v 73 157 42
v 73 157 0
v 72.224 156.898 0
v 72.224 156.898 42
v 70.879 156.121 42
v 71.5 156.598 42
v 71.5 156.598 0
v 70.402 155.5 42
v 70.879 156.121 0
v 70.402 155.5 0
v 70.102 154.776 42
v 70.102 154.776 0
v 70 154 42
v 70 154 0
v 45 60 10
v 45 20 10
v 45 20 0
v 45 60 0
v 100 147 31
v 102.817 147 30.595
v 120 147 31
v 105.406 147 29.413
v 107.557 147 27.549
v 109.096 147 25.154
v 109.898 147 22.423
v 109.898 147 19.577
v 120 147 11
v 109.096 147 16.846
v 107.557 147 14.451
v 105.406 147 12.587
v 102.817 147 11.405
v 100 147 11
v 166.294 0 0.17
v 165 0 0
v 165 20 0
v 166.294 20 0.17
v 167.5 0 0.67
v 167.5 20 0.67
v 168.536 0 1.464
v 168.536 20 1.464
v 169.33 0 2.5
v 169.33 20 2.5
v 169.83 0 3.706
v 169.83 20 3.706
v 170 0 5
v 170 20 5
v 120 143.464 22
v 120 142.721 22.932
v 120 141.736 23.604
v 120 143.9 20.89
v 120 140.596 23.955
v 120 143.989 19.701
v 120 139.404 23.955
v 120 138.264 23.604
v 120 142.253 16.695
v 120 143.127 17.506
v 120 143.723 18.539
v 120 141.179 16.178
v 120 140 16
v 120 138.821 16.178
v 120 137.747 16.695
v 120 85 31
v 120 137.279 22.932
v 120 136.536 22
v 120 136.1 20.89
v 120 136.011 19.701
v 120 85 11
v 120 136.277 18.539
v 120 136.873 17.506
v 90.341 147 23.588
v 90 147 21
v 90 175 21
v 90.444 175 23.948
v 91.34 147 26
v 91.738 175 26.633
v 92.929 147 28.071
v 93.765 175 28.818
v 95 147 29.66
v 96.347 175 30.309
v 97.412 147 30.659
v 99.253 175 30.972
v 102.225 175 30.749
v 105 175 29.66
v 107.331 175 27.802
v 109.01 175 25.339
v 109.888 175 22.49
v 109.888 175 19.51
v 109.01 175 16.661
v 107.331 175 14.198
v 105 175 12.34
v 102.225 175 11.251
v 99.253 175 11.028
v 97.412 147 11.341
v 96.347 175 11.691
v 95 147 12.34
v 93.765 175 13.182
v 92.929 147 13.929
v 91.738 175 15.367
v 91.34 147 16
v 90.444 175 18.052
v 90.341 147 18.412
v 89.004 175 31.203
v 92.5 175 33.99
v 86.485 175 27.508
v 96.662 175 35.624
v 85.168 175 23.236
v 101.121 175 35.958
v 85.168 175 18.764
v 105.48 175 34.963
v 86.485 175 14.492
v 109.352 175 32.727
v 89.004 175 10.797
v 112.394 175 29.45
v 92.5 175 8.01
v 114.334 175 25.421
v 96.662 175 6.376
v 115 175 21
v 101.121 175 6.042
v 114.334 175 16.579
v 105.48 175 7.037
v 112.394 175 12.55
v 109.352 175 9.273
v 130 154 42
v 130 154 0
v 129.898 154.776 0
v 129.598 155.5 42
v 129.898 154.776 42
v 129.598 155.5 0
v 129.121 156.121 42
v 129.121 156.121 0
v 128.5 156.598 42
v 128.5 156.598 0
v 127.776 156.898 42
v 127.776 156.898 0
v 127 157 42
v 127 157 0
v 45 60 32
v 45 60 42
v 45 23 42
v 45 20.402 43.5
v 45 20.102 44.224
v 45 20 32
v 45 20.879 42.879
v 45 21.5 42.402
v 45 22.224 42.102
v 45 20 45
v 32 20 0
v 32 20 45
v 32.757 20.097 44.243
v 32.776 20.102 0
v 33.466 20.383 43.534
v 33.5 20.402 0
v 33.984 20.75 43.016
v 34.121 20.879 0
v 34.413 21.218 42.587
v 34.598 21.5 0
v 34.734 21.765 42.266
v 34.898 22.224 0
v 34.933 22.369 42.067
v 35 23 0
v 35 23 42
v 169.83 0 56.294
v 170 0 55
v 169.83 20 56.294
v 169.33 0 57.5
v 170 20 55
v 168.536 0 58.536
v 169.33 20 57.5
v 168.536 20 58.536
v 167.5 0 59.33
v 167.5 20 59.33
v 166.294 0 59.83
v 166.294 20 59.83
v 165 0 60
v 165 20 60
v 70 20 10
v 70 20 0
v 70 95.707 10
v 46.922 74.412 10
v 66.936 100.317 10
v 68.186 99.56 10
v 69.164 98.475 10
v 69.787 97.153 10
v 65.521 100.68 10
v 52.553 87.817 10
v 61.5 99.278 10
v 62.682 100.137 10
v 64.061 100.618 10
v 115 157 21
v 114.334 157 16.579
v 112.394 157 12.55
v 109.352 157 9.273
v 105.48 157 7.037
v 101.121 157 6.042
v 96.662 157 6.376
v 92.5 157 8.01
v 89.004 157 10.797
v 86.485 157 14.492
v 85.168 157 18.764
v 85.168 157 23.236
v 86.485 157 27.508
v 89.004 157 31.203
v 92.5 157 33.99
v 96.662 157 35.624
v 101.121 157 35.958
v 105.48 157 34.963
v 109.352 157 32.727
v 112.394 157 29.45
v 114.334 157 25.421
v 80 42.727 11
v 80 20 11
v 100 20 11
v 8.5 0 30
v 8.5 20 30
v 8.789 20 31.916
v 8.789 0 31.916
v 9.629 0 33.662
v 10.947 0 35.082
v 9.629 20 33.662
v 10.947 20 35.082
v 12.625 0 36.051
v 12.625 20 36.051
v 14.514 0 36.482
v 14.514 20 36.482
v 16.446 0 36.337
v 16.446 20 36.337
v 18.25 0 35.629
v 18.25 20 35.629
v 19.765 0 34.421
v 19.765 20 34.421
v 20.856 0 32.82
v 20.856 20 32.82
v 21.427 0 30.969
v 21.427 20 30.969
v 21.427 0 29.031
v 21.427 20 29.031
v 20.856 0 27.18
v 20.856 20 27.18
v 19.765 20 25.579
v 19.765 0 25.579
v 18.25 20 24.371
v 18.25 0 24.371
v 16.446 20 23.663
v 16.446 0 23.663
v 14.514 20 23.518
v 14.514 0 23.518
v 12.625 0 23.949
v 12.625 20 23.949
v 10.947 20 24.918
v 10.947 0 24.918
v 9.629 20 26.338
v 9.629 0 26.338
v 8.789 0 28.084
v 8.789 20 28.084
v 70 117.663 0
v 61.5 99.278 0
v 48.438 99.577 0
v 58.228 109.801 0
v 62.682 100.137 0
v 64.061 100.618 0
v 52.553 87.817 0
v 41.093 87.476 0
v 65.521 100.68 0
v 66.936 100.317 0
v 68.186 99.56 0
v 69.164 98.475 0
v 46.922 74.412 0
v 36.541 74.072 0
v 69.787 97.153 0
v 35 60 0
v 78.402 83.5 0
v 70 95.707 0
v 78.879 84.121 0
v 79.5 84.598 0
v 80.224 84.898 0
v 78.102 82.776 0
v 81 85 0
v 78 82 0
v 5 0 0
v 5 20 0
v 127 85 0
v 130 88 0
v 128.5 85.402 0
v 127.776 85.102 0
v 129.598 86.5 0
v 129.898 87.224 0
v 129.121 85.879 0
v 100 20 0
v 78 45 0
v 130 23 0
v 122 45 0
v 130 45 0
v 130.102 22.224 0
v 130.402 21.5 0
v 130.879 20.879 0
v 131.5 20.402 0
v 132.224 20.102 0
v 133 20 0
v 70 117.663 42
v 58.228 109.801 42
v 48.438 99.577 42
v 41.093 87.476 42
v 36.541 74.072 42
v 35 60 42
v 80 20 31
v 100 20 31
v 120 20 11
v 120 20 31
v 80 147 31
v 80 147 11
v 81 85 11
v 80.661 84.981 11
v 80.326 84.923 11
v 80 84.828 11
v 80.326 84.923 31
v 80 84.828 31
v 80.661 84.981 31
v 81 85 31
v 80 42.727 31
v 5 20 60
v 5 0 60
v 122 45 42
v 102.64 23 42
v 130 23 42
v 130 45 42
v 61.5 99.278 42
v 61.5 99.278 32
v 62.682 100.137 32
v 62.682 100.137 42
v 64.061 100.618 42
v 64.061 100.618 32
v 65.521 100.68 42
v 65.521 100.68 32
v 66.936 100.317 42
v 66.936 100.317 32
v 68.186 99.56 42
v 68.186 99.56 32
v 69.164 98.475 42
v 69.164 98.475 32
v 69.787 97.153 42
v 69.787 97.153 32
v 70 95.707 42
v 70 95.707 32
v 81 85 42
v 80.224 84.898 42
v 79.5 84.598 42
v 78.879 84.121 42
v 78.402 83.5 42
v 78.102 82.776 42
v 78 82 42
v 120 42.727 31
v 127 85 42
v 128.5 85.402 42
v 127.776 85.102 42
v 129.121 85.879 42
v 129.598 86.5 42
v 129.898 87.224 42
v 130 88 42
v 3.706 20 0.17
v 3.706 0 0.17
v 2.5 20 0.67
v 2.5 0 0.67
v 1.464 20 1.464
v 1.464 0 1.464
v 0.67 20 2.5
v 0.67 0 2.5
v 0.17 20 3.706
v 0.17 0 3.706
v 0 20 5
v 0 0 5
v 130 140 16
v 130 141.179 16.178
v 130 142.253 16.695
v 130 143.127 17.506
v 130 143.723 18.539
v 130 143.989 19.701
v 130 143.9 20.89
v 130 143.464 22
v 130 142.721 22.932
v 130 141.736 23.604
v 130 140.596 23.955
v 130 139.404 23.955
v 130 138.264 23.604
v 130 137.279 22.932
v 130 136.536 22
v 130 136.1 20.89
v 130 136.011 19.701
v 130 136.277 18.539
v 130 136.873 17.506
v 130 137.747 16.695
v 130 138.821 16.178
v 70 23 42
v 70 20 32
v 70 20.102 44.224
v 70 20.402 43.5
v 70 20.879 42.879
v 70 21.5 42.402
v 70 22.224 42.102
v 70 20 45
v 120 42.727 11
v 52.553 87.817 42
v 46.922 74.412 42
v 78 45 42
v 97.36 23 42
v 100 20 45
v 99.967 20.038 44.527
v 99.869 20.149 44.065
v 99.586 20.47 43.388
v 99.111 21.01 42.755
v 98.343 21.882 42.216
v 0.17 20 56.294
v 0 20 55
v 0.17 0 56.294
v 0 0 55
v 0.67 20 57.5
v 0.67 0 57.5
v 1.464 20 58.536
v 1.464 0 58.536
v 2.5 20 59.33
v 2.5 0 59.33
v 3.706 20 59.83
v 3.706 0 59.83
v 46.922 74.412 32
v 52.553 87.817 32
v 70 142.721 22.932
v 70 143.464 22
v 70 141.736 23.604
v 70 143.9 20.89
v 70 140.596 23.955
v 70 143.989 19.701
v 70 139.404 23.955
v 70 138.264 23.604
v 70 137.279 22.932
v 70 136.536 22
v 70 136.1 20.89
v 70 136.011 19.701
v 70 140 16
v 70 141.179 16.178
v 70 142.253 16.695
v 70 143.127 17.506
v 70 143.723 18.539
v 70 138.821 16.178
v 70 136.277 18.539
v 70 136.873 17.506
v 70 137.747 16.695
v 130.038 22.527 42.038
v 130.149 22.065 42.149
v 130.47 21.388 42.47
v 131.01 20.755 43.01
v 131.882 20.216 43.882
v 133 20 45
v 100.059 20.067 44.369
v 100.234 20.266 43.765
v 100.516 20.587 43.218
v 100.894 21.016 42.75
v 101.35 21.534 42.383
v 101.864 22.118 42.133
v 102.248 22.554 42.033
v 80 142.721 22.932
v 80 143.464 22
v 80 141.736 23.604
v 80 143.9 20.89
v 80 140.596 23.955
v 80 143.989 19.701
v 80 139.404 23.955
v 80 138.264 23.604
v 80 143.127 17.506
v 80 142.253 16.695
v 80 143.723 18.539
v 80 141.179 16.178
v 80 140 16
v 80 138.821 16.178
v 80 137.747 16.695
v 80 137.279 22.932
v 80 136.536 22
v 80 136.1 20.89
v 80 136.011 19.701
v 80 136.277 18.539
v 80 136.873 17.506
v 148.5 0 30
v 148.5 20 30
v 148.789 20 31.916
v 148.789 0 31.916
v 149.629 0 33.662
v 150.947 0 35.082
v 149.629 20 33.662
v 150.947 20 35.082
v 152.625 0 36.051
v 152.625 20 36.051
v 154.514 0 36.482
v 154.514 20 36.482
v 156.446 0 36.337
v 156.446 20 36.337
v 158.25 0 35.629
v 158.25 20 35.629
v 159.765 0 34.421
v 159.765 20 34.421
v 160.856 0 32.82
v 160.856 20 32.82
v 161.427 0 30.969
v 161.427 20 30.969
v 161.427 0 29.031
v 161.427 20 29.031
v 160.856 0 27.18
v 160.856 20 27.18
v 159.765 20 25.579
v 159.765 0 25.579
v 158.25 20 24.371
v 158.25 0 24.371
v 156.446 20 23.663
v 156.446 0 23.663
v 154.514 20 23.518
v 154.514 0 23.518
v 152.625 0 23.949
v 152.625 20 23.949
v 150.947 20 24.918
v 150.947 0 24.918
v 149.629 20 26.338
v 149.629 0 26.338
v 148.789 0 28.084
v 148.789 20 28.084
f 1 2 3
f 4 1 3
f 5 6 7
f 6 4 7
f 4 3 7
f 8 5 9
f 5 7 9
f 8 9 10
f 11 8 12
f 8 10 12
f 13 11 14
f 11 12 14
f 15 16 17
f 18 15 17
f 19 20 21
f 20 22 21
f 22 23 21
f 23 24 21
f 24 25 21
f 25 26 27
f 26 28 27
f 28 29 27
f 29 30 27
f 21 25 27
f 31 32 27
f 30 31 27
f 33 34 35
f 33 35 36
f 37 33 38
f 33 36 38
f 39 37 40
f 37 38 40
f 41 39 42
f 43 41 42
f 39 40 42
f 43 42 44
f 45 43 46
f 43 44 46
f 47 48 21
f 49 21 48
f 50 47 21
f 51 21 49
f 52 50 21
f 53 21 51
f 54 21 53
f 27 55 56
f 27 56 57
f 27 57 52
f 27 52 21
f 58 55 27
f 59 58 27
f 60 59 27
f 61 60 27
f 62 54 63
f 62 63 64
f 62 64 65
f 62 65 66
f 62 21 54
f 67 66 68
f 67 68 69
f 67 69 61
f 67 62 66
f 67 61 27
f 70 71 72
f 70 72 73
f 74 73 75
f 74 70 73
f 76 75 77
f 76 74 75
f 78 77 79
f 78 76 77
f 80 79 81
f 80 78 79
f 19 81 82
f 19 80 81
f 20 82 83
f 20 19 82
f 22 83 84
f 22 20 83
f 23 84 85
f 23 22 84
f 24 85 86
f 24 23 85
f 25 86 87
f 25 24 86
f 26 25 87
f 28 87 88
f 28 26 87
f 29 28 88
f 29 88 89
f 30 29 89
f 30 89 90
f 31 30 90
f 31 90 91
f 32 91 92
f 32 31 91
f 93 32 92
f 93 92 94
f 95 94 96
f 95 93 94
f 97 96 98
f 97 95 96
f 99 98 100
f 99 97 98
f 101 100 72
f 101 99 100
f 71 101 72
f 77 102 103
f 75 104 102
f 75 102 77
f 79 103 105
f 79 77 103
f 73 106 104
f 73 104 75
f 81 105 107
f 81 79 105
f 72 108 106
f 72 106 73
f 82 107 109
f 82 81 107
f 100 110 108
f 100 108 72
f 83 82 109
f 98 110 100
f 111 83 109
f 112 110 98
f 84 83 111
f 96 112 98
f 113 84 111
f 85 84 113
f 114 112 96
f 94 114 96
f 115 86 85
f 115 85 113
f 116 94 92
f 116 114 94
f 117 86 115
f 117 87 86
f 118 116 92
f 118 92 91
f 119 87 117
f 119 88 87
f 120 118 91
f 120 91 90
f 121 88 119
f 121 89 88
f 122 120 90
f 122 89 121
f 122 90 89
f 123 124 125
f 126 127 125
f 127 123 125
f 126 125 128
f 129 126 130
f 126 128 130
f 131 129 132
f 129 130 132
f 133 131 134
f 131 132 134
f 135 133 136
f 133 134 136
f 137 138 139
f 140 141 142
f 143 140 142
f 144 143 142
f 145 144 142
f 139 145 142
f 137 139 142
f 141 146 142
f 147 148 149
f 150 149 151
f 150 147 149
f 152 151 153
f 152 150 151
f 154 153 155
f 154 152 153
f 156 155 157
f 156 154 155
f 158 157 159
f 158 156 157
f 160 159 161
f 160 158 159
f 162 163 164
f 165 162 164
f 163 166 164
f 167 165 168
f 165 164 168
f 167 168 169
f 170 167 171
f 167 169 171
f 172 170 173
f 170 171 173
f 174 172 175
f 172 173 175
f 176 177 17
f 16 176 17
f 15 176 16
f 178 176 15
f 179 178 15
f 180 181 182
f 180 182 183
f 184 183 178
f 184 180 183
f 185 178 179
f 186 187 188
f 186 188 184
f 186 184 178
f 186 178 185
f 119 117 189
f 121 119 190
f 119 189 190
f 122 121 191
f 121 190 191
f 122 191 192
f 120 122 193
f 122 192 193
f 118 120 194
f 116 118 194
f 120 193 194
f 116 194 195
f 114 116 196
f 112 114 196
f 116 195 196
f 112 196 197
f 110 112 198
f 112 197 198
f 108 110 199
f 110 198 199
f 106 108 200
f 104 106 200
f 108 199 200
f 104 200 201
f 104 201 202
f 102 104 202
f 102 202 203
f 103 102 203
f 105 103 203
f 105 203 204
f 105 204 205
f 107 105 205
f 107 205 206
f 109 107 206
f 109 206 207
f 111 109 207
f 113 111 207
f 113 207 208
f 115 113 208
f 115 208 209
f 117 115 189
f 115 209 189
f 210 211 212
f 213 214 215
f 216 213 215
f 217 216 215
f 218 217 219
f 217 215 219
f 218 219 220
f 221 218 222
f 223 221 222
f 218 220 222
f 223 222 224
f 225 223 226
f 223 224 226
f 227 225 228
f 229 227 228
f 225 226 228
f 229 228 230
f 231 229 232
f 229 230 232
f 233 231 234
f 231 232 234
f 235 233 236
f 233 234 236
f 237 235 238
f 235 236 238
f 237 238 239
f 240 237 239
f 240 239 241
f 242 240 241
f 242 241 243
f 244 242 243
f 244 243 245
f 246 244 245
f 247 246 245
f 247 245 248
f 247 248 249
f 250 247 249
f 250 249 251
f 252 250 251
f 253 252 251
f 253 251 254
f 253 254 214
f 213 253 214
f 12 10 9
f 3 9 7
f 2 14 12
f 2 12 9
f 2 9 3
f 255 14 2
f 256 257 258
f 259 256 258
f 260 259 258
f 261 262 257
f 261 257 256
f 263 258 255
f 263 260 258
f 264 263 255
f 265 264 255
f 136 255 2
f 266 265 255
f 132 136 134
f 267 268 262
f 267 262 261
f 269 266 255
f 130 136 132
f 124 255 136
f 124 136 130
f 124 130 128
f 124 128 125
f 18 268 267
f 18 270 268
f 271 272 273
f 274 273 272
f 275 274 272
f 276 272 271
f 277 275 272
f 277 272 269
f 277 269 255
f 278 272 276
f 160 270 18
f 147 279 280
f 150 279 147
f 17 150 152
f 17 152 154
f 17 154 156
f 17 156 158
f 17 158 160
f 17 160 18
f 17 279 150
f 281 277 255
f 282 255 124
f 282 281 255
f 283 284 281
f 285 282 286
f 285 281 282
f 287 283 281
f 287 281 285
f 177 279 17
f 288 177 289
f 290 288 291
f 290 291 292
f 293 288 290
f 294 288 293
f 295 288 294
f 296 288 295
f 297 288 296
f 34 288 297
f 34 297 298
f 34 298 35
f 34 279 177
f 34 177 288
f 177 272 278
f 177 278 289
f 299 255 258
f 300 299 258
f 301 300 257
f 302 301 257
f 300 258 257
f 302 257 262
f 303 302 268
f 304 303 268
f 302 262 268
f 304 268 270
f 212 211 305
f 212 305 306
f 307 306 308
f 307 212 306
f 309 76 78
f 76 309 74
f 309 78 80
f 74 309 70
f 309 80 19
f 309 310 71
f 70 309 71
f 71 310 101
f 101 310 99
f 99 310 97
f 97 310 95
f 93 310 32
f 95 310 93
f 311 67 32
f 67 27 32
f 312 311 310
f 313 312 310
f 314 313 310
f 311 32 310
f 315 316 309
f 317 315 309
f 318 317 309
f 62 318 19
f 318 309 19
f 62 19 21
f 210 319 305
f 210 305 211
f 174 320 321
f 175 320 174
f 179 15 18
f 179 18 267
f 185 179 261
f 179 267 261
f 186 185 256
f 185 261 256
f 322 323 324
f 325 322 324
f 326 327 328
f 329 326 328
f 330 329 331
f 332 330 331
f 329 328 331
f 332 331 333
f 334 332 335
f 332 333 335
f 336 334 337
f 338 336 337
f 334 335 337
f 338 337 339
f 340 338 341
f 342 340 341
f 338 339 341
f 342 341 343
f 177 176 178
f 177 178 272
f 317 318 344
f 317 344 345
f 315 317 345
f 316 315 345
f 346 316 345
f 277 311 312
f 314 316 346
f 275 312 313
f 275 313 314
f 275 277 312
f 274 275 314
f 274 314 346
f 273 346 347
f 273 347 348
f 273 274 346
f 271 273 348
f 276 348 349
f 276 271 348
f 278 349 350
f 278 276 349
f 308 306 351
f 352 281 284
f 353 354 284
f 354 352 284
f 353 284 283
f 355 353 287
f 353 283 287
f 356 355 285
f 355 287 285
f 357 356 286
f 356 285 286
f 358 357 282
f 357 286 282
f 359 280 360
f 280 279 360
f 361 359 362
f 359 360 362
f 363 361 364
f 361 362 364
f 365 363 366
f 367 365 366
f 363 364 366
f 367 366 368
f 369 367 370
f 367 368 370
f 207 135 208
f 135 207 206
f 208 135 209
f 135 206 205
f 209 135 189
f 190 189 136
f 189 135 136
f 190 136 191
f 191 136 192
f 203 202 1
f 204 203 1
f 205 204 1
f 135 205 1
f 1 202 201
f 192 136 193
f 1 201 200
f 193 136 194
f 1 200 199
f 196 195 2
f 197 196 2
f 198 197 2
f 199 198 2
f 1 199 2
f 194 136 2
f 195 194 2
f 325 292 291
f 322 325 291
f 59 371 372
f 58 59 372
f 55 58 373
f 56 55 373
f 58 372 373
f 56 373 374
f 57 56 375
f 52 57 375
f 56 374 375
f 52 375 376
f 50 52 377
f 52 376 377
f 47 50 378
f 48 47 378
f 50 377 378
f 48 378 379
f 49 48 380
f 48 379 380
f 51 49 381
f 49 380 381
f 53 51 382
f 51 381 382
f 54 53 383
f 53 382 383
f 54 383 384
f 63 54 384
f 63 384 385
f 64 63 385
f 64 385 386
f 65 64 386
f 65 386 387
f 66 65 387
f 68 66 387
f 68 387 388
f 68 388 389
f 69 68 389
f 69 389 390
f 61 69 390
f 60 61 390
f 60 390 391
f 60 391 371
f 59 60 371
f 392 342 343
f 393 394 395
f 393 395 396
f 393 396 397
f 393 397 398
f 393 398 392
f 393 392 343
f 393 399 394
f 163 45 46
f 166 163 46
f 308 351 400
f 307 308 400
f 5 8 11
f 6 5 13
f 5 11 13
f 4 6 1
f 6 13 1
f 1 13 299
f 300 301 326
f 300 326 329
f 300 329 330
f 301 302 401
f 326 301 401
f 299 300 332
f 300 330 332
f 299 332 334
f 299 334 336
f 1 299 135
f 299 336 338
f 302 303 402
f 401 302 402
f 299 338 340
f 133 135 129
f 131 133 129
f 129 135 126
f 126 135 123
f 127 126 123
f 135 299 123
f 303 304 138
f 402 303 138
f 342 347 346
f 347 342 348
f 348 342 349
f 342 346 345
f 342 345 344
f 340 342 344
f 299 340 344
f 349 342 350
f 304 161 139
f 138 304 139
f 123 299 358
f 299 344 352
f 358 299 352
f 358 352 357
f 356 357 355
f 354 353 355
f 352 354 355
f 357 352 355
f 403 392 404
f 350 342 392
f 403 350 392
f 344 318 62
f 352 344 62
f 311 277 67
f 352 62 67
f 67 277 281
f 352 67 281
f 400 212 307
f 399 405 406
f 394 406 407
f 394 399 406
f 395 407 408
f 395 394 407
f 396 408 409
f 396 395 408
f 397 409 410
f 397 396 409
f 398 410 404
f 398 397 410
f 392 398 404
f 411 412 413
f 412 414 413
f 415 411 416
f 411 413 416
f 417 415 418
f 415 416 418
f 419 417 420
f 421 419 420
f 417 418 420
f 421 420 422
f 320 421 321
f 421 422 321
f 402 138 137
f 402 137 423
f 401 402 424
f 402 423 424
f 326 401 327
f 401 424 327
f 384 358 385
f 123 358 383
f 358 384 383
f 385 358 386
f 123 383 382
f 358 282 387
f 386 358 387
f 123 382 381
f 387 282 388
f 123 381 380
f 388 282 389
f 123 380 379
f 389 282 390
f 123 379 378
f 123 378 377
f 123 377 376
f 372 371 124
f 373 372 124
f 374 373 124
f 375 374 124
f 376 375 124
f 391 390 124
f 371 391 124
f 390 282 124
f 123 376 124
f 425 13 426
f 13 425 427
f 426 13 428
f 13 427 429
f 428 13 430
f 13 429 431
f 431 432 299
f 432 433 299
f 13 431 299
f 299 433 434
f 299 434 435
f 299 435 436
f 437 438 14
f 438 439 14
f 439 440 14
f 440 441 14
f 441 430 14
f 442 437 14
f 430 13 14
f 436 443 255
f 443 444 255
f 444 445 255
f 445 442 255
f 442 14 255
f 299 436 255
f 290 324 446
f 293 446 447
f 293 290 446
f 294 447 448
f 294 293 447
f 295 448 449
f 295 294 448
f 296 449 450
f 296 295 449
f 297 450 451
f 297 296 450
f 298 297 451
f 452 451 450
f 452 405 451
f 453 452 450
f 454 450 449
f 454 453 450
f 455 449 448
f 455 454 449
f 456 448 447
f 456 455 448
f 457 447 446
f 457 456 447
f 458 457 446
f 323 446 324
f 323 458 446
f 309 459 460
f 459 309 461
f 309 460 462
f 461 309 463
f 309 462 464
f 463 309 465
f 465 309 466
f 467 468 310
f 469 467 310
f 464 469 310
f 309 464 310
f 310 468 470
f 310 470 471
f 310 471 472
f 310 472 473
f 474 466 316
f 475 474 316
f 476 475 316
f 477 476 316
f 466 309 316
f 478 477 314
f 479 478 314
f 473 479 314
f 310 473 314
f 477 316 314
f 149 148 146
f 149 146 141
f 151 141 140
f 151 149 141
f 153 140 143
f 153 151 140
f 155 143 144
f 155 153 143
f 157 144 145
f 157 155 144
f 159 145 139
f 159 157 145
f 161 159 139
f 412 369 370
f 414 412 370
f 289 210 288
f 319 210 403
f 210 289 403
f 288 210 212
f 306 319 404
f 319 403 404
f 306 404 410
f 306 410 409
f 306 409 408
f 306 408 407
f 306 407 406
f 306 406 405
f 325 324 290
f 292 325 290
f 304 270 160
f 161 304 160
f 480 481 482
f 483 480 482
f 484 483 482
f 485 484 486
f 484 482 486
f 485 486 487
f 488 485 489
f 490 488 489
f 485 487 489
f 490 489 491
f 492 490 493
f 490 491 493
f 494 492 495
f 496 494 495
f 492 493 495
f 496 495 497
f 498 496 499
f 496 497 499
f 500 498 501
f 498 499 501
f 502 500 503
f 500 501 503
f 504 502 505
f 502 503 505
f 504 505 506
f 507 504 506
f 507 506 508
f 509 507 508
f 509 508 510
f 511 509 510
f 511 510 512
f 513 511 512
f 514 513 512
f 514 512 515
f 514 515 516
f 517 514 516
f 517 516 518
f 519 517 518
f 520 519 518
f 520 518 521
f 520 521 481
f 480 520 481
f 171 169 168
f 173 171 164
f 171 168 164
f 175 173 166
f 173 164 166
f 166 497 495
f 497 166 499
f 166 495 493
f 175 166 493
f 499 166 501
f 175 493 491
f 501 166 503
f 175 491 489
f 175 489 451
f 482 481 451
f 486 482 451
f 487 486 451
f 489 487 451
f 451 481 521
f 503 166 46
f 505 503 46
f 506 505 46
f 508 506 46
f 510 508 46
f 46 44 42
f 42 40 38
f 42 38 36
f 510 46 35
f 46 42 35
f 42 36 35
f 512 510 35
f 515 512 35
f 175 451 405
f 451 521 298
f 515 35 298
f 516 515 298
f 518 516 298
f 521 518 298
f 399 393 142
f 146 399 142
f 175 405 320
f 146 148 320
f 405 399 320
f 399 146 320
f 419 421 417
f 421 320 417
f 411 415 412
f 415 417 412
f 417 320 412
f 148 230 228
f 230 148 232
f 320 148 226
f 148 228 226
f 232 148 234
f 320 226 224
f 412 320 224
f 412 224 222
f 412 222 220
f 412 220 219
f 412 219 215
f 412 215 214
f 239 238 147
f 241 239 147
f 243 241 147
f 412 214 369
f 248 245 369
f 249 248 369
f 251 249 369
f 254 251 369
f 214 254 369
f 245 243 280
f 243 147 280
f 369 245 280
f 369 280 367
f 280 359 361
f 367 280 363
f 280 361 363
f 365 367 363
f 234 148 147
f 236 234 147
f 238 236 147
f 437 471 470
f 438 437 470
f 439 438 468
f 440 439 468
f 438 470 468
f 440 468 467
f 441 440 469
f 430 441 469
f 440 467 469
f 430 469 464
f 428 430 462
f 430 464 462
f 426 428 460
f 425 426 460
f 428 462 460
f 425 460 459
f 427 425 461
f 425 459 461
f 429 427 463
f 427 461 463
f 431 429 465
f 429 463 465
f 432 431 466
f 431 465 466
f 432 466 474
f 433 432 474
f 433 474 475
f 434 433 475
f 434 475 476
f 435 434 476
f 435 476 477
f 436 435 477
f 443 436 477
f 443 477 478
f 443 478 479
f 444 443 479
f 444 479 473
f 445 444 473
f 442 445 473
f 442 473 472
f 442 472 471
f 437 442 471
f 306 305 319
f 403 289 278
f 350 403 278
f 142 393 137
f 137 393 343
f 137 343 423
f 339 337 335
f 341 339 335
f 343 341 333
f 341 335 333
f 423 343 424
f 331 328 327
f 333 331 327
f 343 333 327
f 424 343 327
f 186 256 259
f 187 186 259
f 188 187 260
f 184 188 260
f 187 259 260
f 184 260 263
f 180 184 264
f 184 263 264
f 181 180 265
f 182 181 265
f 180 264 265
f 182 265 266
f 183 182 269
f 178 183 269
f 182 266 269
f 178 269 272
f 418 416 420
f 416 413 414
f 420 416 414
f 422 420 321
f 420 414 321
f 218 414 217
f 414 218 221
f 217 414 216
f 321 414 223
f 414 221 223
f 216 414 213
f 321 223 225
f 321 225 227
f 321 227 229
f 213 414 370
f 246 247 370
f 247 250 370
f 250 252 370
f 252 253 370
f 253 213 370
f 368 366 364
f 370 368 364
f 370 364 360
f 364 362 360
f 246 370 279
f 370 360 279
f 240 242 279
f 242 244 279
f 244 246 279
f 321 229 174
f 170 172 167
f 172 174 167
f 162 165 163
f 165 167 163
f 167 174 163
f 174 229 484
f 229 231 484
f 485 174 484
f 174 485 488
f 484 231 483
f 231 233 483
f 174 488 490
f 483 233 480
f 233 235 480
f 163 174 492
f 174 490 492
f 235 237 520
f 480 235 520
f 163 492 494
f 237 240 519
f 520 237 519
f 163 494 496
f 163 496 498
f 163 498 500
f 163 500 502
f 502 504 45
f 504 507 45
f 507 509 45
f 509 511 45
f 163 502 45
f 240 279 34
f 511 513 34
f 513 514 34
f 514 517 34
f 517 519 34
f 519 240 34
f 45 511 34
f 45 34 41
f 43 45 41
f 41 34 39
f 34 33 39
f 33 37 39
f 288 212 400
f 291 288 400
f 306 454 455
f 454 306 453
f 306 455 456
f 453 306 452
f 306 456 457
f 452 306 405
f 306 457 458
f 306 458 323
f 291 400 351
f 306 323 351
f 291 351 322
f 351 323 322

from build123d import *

# Parameters (mm, degrees)
BOSS_EXTRUDE1_DEPTH = 60
BOSS_EXTRUDE2_DEPTH = 42
CUT_EXTRUDE1_DEPTH  = 42
SKETCH4_R           = 15
SKETCH4_R_2         = 10
BOSS_EXTRUDE4_DEPTH = 18
CUT_EXTRUDE2_START  = -10
SKETCH4_2_R         = 10
CUT_EXTRUDE2_DEPTH  = 10
CUT_EXTRUDE3_START  = -127
SKETCH5_W           = 40
SKETCH5_H           = 20
CUT_EXTRUDE3_DEPTH  = 127
SKETCH6_R           = 6.5
CUT_EXTRUDE4_DEPTH  = 183
SKETCH7_R           = 4
CUT_EXTRUDE5_DEPTH  = 245
FILLET1_R           = 3
FILLET2_R           = 5
BOSS_EXTRUDE6_DEPTH = 22


with BuildPart() as part:
    # Sketch1 → Boss-Extrude1 (new body)
    with BuildSketch(Plane.XY):
        Polygon((170, 20), (130, 20), (0, 20), (0, 0), (170, 0), align=None)
    extrude(amount=BOSS_EXTRUDE1_DEPTH)

    # Sketch1<3> → Boss-Extrude2 (add)
    with BuildSketch(Plane.XY):
        with BuildLine():
            Line((35, 60), (35, 20))
            Line((35, 20), (45, 20))
            Line((45, 20), (45, 60))
            ThreePointArc((45, 60), (49.292505485, 81.301408404), (61.5, 99.277856357))
            ThreePointArc((61.5, 99.277856357), (66.936491673, 100.316914371), (70, 95.707142143))
            Line((70, 95.707142143), (70, 20))
            Line((70, 20), (100, 20))
            Line((100, 20), (78, 45))
            Line((78, 45), (78, 85))
            Line((78, 85), (130, 85))
            Line((130, 85), (130, 157))
            Line((130, 157), (115, 157))
            Line((115, 157), (115, 175))
            Line((115, 175), (85, 175))
            Line((85, 175), (85, 157))
            Line((85, 157), (70, 157))
            Line((70, 157), (70, 117.662812973))
            ThreePointArc((70, 117.662812973), (44.434723073, 93.726843908), (35, 60))
        make_face()
        Polygon((100, 20), (130, 20), (130, 45), (122, 45), align=None)
    extrude(amount=BOSS_EXTRUDE2_DEPTH)

    # Sketch3 → Cut-Extrude1 (cut)
    with BuildSketch(Plane(origin=(115, 0, 0), x_dir=(0, 0, -1), z_dir=(1, 0, 0))):
        Polygon((-42, 157), (7.234036257, 157), (7.234036257, 179.627454065), (-54.634398112, 179.627454065), (-54.634398112, 157), align=None)
    extrude(amount=-CUT_EXTRUDE1_DEPTH, mode=Mode.SUBTRACT)

    # Sketch4 → Boss-Extrude4 (add)
    with BuildSketch(Plane(origin=(0, 157, 0), x_dir=(1, 0, 0), z_dir=(0, 1, 0))):
        with Locations((100, -21)):
            Circle(SKETCH4_R)
        with Locations(Location((100, -21, 0), (0, 0, 180))):
            Circle(SKETCH4_R_2, mode=Mode.SUBTRACT)
    extrude(amount=BOSS_EXTRUDE4_DEPTH)

    # Sketch4<2> → Cut-Extrude2 (cut)
    with BuildSketch(Plane(origin=(0, 157, 0), x_dir=(1, 0, 0), z_dir=(0, 1, 0)).offset(CUT_EXTRUDE2_START)):
        with Locations(Location((100, -21, 0), (0, 0, 180))):
            Circle(SKETCH4_2_R)
    extrude(amount=CUT_EXTRUDE2_DEPTH, mode=Mode.SUBTRACT)

    # Sketch5 → Cut-Extrude3 (cut)
    with BuildSketch(Plane(origin=(0, 147, 0), x_dir=(1, 0, 0), z_dir=(0, 1, 0)).offset(CUT_EXTRUDE3_START)):
        with Locations((100, -21)):
            Rectangle(SKETCH5_W, SKETCH5_H)
    extrude(amount=CUT_EXTRUDE3_DEPTH, mode=Mode.SUBTRACT)

    # Sketch6 → Cut-Extrude4 (cut)
    with BuildSketch(Plane(origin=(0, 20, 0), x_dir=(1, 0, 0), z_dir=(0, 1, 0))):
        with Locations(Location((15, -30, 0), (0, 0, 180))):
            Circle(SKETCH6_R)
        with Locations(Location((155, -30, 0), (0, 0, 180))):
            Circle(SKETCH6_R)
    extrude(amount=-CUT_EXTRUDE4_DEPTH, mode=Mode.SUBTRACT)

    # Sketch7 → Cut-Extrude5 (cut)
    with BuildSketch(Plane(origin=(130, 0, 0), x_dir=(0, 0, -1), z_dir=(1, 0, 0))):
        with Locations((-20, 140)):
            Circle(SKETCH7_R)
    extrude(amount=-CUT_EXTRUDE5_DEPTH, mode=Mode.SUBTRACT)

    # Fillet1
    # the kernel refuses this fillet: 3 mm, written as the material it adds along each edge
    with BuildSketch(Plane(origin=(100, 20, 42), x_dir=(0, 0, 1), z_dir=(1, 0, 0))) as fillet1_piece_1_section:
        with BuildLine():
            CenterArc((FILLET1_R, -FILLET1_R), FILLET1_R, 90, 90)
            Line((0, -FILLET1_R), (0, 0))
            Line((0, 0), (FILLET1_R, 0))
        make_face()
    fillet1_piece_1 = extrude(amount=30, mode=Mode.PRIVATE)
    fillet1_piece_1 = split(fillet1_piece_1, bisect_by=Plane(origin=(107.006094621, 27.96147116, 42.686468699), z_dir=(0.7507135169227557, -0.6606278948920244, 0)), keep=Keep.TOP, mode=Mode.PRIVATE)
    add(fillet1_piece_1)
    with BuildSketch(Plane(origin=(78, 85, 0), x_dir=(0, -1, 0), z_dir=(0, 0, 1))) as fillet1_piece_2_section:
        with BuildLine():
            CenterArc((FILLET1_R, FILLET1_R), FILLET1_R, 180, 90)
            Line((0, FILLET1_R), (0, 0))
            Line((0, 0), (FILLET1_R, 0))
        make_face()
    fillet1_piece_2 = extrude(amount=42, mode=Mode.PRIVATE)
    fillet1_piece_2 = split(fillet1_piece_2, bisect_by=Plane(origin=(78.588320005, 84.284989696, 11), z_dir=(0, 0, -1)), keep=Keep.TOP, mode=Mode.PRIVATE)
    fillet1_piece_2 = split(fillet1_piece_2, bisect_by=Plane(origin=(80, 84.284989696, 5.5), z_dir=(-1, 0, 0)), keep=Keep.TOP, mode=Mode.PRIVATE)
    add(fillet1_piece_2)
    with BuildSketch(Plane(origin=(78, 85, 0), x_dir=(0, -1, 0), z_dir=(0, 0, 1))) as fillet1_piece_3_section:
        with BuildLine():
            CenterArc((FILLET1_R, FILLET1_R), FILLET1_R, 180, 90)
            Line((0, FILLET1_R), (0, 0))
            Line((0, 0), (FILLET1_R, 0))
        make_face()
    fillet1_piece_3 = extrude(amount=42, mode=Mode.PRIVATE)
    fillet1_piece_3 = split(fillet1_piece_3, bisect_by=Plane(origin=(80.37802851, 84.990607918, 11), z_dir=(0, 0, -1)), keep=Keep.TOP, mode=Mode.PRIVATE)
    fillet1_piece_3 = split(fillet1_piece_3, bisect_by=Plane(origin=(80, 84.990607918, 5.5), z_dir=(1, 0, 0)), keep=Keep.TOP, mode=Mode.PRIVATE)
    add(fillet1_piece_3)
    with BuildSketch(Plane(origin=(78, 85, 0), x_dir=(0, -1, 0), z_dir=(0, 0, 1))) as fillet1_piece_4_section:
        with BuildLine():
            CenterArc((FILLET1_R, FILLET1_R), FILLET1_R, 180, 90)
            Line((0, FILLET1_R), (0, 0))
            Line((0, 0), (FILLET1_R, 0))
        make_face()
    fillet1_piece_4 = extrude(amount=42, mode=Mode.PRIVATE)
    fillet1_piece_4 = split(fillet1_piece_4, bisect_by=Plane(origin=(78.588320005, 84.284989696, 11), z_dir=(0, 0, 1)), keep=Keep.TOP, mode=Mode.PRIVATE)
    fillet1_piece_4 = split(fillet1_piece_4, bisect_by=Plane(origin=(80, 84.284989696, 21), z_dir=(-1, 0, 0)), keep=Keep.TOP, mode=Mode.PRIVATE)
    fillet1_piece_4 = split(fillet1_piece_4, bisect_by=Plane(origin=(78.588320005, 84.284989696, 31), z_dir=(0, 0, -1)), keep=Keep.TOP, mode=Mode.PRIVATE)
    add(fillet1_piece_4)
    with BuildSketch(Plane(origin=(78, 85, 0), x_dir=(0, -1, 0), z_dir=(0, 0, 1))) as fillet1_piece_5_section:
        with BuildLine():
            CenterArc((FILLET1_R, FILLET1_R), FILLET1_R, 180, 90)
            Line((0, FILLET1_R), (0, 0))
            Line((0, 0), (FILLET1_R, 0))
        make_face()
    fillet1_piece_5 = extrude(amount=42, mode=Mode.PRIVATE)
    fillet1_piece_5 = split(fillet1_piece_5, bisect_by=Plane(origin=(80, 84.284989696, 36.5), z_dir=(-1, 0, 0)), keep=Keep.TOP, mode=Mode.PRIVATE)
    fillet1_piece_5 = split(fillet1_piece_5, bisect_by=Plane(origin=(78.588320005, 84.284989696, 31), z_dir=(0, 0, 1)), keep=Keep.TOP, mode=Mode.PRIVATE)
    add(fillet1_piece_5)
    with BuildSketch(Plane(origin=(78, 85, 0), x_dir=(0, -1, 0), z_dir=(0, 0, 1))) as fillet1_piece_6_section:
        with BuildLine():
            CenterArc((FILLET1_R, FILLET1_R), FILLET1_R, 180, 90)
            Line((0, FILLET1_R), (0, 0))
            Line((0, 0), (FILLET1_R, 0))
        make_face()
    fillet1_piece_6 = extrude(amount=42, mode=Mode.PRIVATE)
    fillet1_piece_6 = split(fillet1_piece_6, bisect_by=Plane(origin=(80, 84.990607918, 36.5), z_dir=(1, 0, 0)), keep=Keep.TOP, mode=Mode.PRIVATE)
    fillet1_piece_6 = split(fillet1_piece_6, bisect_by=Plane(origin=(80.37802851, 84.990607918, 31), z_dir=(0, 0, 1)), keep=Keep.TOP, mode=Mode.PRIVATE)
    add(fillet1_piece_6)
    with BuildSketch(Plane(origin=(130, 20, 0), x_dir=(1, 0, 0), z_dir=(0, 0, 1))) as fillet1_piece_7:
        with BuildLine():
            CenterArc((FILLET1_R, FILLET1_R), FILLET1_R, 180, 90)
            Line((0, FILLET1_R), (0, 0))
            Line((0, 0), (FILLET1_R, 0))
        make_face()
    extrude(amount=42)
    with BuildSketch(Plane(origin=(70, 20, 42), x_dir=(0, 0, 1), z_dir=(1, 0, 0))) as fillet1_piece_8_section:
        with BuildLine():
            CenterArc((FILLET1_R, -FILLET1_R), FILLET1_R, 90, 90)
            Line((0, -FILLET1_R), (0, 0))
            Line((0, 0), (FILLET1_R, 0))
        make_face()
    fillet1_piece_8 = extrude(amount=30, mode=Mode.PRIVATE)
    fillet1_piece_8 = split(fillet1_piece_8, bisect_by=Plane(origin=(92.993905379, 27.96147116, 42.686468699), z_dir=(-0.7507135169227557, -0.6606278948920244, 0)), keep=Keep.TOP, mode=Mode.PRIVATE)
    add(fillet1_piece_8)
    with BuildSketch(Plane(origin=(35, 20, 0), x_dir=(-1, 0, 0), z_dir=(0, 0, 1))) as fillet1_piece_9:
        with BuildLine():
            CenterArc((FILLET1_R, -FILLET1_R), FILLET1_R, 90, 90)
            Line((0, -FILLET1_R), (0, 0))
            Line((0, 0), (FILLET1_R, 0))
        make_face()
    extrude(amount=42)
    with BuildSketch(Plane(origin=(35, 20, 42), x_dir=(0, 0, 1), z_dir=(1, 0, 0))) as fillet1_piece_10:
        with BuildLine():
            CenterArc((FILLET1_R, -FILLET1_R), FILLET1_R, 90, 90)
            Line((0, -FILLET1_R), (0, 0))
            Line((0, 0), (FILLET1_R, 0))
        make_face()
    extrude(amount=10)
    with BuildSketch(Plane(origin=(130, 20, 0), x_dir=(1, 0, 0), z_dir=(0, 0, 1))) as fillet1_piece_11a_section:
        with BuildLine():
            CenterArc((FILLET1_R, FILLET1_R), FILLET1_R, 180, 90)
            Line((0, FILLET1_R), (0, 0))
            Line((0, 0), (FILLET1_R, 0))
        make_face()
    fillet1_piece_11a = extrude(amount=49.5, mode=Mode.PRIVATE)
    fillet1_piece_11a = split(fillet1_piece_11a, bisect_by=Plane(origin=(130.679185343, 20.679185343, 42), z_dir=(0, 0, 1)), keep=Keep.TOP, mode=Mode.PRIVATE)
    with BuildSketch(Plane(origin=(100, 20, 42), x_dir=(0, 0, 1), z_dir=(1, 0, 0))) as fillet1_piece_11b_section:
        with BuildLine():
            CenterArc((FILLET1_R, -FILLET1_R), FILLET1_R, 90, 90)
            Line((0, -FILLET1_R), (0, 0))
            Line((0, 0), (FILLET1_R, 0))
        make_face()
    fillet1_piece_11b = extrude(amount=37.5, mode=Mode.PRIVATE)
    fillet1_piece_11b = split(fillet1_piece_11b, bisect_by=Plane(origin=(130, 20.679185343, 42.679185343), z_dir=(1, 0, 0)), keep=Keep.TOP, mode=Mode.PRIVATE)
    fillet1_piece_11 = fillet1_piece_11a & fillet1_piece_11b
    add(fillet1_piece_11)
    with BuildSketch(Plane(origin=(35, 20, 0), x_dir=(-1, 0, 0), z_dir=(0, 0, 1))) as fillet1_piece_12a_section:
        with BuildLine():
            CenterArc((FILLET1_R, -FILLET1_R), FILLET1_R, 90, 90)
            Line((0, -FILLET1_R), (0, 0))
            Line((0, 0), (FILLET1_R, 0))
        make_face()
    fillet1_piece_12a = extrude(amount=49.5, mode=Mode.PRIVATE)
    fillet1_piece_12a = split(fillet1_piece_12a, bisect_by=Plane(origin=(34.320814657, 20.679185343, 42), z_dir=(0, 0, 1)), keep=Keep.TOP, mode=Mode.PRIVATE)
    with BuildSketch(Plane(origin=(27.5, 20, 42), x_dir=(0, 0, 1), z_dir=(1, 0, 0))) as fillet1_piece_12b_section:
        with BuildLine():
            CenterArc((FILLET1_R, -FILLET1_R), FILLET1_R, 90, 90)
            Line((0, -FILLET1_R), (0, 0))
            Line((0, 0), (FILLET1_R, 0))
        make_face()
    fillet1_piece_12b = extrude(amount=17.5, mode=Mode.PRIVATE)
    fillet1_piece_12b = split(fillet1_piece_12b, bisect_by=Plane(origin=(35, 20.679185343, 42.679185343), z_dir=(-1, 0, 0)), keep=Keep.TOP, mode=Mode.PRIVATE)
    fillet1_piece_12 = fillet1_piece_12a & fillet1_piece_12b
    add(fillet1_piece_12)
    # the kernel refuses this fillet: 3 mm, written as the material it takes off along each edge
    with BuildSketch(Plane(origin=(70, 157, -7.5), x_dir=(1, 0, 0), z_dir=(0, 0, 1))) as fillet1_2_piece_1:
        with BuildLine():
            CenterArc((FILLET1_R, -FILLET1_R), FILLET1_R, 90, 90)
            Line((0, -FILLET1_R), (0, 0))
            Line((0, 0), (FILLET1_R, 0))
        make_face()
    extrude(amount=57, mode=Mode.SUBTRACT)
    with BuildSketch(Plane(origin=(130, 157, -7.5), x_dir=(-1, 0, 0), z_dir=(0, 0, 1)), Plane(origin=(130, 85, -7.5), x_dir=(0, 1, 0), z_dir=(0, 0, 1))) as fillet1_2_piece_2:
        with BuildLine():
            CenterArc((FILLET1_R, FILLET1_R), FILLET1_R, 180, 90)
            Line((0, FILLET1_R), (0, 0))
            Line((0, 0), (FILLET1_R, 0))
        make_face()
    extrude(amount=57, mode=Mode.SUBTRACT)

    # Fillet2
    fillet2_edges = [part.edges().sort_by_distance(p)[0] for p in [
        (0, 10, 60),
        (170, 10, 60),
        (170, 10, 0),
        (0, 10, 0),
    ]]
    fillet(fillet2_edges, radius=FILLET2_R)

    # Sketch8 → Boss-Extrude6 (add)
    with BuildSketch(Plane(origin=(0, 0, 10), x_dir=(-1, 0, 0), z_dir=(0, 0, -1))):
        with BuildLine():
            ThreePointArc((-45, 60), (-49.292505485, 81.301408404), (-61.5, 99.277856357))
            ThreePointArc((-61.5, 99.277856357), (-66.936491673, 100.316914371), (-70, 95.707142143))
            Line((-70, 95.707142143), (-70, 20))
            Line((-70, 20), (-45, 20))
            Line((-45, 20), (-45, 60))
        make_face()
    extrude(amount=-BOSS_EXTRUDE6_DEPTH)


solid = part.part
